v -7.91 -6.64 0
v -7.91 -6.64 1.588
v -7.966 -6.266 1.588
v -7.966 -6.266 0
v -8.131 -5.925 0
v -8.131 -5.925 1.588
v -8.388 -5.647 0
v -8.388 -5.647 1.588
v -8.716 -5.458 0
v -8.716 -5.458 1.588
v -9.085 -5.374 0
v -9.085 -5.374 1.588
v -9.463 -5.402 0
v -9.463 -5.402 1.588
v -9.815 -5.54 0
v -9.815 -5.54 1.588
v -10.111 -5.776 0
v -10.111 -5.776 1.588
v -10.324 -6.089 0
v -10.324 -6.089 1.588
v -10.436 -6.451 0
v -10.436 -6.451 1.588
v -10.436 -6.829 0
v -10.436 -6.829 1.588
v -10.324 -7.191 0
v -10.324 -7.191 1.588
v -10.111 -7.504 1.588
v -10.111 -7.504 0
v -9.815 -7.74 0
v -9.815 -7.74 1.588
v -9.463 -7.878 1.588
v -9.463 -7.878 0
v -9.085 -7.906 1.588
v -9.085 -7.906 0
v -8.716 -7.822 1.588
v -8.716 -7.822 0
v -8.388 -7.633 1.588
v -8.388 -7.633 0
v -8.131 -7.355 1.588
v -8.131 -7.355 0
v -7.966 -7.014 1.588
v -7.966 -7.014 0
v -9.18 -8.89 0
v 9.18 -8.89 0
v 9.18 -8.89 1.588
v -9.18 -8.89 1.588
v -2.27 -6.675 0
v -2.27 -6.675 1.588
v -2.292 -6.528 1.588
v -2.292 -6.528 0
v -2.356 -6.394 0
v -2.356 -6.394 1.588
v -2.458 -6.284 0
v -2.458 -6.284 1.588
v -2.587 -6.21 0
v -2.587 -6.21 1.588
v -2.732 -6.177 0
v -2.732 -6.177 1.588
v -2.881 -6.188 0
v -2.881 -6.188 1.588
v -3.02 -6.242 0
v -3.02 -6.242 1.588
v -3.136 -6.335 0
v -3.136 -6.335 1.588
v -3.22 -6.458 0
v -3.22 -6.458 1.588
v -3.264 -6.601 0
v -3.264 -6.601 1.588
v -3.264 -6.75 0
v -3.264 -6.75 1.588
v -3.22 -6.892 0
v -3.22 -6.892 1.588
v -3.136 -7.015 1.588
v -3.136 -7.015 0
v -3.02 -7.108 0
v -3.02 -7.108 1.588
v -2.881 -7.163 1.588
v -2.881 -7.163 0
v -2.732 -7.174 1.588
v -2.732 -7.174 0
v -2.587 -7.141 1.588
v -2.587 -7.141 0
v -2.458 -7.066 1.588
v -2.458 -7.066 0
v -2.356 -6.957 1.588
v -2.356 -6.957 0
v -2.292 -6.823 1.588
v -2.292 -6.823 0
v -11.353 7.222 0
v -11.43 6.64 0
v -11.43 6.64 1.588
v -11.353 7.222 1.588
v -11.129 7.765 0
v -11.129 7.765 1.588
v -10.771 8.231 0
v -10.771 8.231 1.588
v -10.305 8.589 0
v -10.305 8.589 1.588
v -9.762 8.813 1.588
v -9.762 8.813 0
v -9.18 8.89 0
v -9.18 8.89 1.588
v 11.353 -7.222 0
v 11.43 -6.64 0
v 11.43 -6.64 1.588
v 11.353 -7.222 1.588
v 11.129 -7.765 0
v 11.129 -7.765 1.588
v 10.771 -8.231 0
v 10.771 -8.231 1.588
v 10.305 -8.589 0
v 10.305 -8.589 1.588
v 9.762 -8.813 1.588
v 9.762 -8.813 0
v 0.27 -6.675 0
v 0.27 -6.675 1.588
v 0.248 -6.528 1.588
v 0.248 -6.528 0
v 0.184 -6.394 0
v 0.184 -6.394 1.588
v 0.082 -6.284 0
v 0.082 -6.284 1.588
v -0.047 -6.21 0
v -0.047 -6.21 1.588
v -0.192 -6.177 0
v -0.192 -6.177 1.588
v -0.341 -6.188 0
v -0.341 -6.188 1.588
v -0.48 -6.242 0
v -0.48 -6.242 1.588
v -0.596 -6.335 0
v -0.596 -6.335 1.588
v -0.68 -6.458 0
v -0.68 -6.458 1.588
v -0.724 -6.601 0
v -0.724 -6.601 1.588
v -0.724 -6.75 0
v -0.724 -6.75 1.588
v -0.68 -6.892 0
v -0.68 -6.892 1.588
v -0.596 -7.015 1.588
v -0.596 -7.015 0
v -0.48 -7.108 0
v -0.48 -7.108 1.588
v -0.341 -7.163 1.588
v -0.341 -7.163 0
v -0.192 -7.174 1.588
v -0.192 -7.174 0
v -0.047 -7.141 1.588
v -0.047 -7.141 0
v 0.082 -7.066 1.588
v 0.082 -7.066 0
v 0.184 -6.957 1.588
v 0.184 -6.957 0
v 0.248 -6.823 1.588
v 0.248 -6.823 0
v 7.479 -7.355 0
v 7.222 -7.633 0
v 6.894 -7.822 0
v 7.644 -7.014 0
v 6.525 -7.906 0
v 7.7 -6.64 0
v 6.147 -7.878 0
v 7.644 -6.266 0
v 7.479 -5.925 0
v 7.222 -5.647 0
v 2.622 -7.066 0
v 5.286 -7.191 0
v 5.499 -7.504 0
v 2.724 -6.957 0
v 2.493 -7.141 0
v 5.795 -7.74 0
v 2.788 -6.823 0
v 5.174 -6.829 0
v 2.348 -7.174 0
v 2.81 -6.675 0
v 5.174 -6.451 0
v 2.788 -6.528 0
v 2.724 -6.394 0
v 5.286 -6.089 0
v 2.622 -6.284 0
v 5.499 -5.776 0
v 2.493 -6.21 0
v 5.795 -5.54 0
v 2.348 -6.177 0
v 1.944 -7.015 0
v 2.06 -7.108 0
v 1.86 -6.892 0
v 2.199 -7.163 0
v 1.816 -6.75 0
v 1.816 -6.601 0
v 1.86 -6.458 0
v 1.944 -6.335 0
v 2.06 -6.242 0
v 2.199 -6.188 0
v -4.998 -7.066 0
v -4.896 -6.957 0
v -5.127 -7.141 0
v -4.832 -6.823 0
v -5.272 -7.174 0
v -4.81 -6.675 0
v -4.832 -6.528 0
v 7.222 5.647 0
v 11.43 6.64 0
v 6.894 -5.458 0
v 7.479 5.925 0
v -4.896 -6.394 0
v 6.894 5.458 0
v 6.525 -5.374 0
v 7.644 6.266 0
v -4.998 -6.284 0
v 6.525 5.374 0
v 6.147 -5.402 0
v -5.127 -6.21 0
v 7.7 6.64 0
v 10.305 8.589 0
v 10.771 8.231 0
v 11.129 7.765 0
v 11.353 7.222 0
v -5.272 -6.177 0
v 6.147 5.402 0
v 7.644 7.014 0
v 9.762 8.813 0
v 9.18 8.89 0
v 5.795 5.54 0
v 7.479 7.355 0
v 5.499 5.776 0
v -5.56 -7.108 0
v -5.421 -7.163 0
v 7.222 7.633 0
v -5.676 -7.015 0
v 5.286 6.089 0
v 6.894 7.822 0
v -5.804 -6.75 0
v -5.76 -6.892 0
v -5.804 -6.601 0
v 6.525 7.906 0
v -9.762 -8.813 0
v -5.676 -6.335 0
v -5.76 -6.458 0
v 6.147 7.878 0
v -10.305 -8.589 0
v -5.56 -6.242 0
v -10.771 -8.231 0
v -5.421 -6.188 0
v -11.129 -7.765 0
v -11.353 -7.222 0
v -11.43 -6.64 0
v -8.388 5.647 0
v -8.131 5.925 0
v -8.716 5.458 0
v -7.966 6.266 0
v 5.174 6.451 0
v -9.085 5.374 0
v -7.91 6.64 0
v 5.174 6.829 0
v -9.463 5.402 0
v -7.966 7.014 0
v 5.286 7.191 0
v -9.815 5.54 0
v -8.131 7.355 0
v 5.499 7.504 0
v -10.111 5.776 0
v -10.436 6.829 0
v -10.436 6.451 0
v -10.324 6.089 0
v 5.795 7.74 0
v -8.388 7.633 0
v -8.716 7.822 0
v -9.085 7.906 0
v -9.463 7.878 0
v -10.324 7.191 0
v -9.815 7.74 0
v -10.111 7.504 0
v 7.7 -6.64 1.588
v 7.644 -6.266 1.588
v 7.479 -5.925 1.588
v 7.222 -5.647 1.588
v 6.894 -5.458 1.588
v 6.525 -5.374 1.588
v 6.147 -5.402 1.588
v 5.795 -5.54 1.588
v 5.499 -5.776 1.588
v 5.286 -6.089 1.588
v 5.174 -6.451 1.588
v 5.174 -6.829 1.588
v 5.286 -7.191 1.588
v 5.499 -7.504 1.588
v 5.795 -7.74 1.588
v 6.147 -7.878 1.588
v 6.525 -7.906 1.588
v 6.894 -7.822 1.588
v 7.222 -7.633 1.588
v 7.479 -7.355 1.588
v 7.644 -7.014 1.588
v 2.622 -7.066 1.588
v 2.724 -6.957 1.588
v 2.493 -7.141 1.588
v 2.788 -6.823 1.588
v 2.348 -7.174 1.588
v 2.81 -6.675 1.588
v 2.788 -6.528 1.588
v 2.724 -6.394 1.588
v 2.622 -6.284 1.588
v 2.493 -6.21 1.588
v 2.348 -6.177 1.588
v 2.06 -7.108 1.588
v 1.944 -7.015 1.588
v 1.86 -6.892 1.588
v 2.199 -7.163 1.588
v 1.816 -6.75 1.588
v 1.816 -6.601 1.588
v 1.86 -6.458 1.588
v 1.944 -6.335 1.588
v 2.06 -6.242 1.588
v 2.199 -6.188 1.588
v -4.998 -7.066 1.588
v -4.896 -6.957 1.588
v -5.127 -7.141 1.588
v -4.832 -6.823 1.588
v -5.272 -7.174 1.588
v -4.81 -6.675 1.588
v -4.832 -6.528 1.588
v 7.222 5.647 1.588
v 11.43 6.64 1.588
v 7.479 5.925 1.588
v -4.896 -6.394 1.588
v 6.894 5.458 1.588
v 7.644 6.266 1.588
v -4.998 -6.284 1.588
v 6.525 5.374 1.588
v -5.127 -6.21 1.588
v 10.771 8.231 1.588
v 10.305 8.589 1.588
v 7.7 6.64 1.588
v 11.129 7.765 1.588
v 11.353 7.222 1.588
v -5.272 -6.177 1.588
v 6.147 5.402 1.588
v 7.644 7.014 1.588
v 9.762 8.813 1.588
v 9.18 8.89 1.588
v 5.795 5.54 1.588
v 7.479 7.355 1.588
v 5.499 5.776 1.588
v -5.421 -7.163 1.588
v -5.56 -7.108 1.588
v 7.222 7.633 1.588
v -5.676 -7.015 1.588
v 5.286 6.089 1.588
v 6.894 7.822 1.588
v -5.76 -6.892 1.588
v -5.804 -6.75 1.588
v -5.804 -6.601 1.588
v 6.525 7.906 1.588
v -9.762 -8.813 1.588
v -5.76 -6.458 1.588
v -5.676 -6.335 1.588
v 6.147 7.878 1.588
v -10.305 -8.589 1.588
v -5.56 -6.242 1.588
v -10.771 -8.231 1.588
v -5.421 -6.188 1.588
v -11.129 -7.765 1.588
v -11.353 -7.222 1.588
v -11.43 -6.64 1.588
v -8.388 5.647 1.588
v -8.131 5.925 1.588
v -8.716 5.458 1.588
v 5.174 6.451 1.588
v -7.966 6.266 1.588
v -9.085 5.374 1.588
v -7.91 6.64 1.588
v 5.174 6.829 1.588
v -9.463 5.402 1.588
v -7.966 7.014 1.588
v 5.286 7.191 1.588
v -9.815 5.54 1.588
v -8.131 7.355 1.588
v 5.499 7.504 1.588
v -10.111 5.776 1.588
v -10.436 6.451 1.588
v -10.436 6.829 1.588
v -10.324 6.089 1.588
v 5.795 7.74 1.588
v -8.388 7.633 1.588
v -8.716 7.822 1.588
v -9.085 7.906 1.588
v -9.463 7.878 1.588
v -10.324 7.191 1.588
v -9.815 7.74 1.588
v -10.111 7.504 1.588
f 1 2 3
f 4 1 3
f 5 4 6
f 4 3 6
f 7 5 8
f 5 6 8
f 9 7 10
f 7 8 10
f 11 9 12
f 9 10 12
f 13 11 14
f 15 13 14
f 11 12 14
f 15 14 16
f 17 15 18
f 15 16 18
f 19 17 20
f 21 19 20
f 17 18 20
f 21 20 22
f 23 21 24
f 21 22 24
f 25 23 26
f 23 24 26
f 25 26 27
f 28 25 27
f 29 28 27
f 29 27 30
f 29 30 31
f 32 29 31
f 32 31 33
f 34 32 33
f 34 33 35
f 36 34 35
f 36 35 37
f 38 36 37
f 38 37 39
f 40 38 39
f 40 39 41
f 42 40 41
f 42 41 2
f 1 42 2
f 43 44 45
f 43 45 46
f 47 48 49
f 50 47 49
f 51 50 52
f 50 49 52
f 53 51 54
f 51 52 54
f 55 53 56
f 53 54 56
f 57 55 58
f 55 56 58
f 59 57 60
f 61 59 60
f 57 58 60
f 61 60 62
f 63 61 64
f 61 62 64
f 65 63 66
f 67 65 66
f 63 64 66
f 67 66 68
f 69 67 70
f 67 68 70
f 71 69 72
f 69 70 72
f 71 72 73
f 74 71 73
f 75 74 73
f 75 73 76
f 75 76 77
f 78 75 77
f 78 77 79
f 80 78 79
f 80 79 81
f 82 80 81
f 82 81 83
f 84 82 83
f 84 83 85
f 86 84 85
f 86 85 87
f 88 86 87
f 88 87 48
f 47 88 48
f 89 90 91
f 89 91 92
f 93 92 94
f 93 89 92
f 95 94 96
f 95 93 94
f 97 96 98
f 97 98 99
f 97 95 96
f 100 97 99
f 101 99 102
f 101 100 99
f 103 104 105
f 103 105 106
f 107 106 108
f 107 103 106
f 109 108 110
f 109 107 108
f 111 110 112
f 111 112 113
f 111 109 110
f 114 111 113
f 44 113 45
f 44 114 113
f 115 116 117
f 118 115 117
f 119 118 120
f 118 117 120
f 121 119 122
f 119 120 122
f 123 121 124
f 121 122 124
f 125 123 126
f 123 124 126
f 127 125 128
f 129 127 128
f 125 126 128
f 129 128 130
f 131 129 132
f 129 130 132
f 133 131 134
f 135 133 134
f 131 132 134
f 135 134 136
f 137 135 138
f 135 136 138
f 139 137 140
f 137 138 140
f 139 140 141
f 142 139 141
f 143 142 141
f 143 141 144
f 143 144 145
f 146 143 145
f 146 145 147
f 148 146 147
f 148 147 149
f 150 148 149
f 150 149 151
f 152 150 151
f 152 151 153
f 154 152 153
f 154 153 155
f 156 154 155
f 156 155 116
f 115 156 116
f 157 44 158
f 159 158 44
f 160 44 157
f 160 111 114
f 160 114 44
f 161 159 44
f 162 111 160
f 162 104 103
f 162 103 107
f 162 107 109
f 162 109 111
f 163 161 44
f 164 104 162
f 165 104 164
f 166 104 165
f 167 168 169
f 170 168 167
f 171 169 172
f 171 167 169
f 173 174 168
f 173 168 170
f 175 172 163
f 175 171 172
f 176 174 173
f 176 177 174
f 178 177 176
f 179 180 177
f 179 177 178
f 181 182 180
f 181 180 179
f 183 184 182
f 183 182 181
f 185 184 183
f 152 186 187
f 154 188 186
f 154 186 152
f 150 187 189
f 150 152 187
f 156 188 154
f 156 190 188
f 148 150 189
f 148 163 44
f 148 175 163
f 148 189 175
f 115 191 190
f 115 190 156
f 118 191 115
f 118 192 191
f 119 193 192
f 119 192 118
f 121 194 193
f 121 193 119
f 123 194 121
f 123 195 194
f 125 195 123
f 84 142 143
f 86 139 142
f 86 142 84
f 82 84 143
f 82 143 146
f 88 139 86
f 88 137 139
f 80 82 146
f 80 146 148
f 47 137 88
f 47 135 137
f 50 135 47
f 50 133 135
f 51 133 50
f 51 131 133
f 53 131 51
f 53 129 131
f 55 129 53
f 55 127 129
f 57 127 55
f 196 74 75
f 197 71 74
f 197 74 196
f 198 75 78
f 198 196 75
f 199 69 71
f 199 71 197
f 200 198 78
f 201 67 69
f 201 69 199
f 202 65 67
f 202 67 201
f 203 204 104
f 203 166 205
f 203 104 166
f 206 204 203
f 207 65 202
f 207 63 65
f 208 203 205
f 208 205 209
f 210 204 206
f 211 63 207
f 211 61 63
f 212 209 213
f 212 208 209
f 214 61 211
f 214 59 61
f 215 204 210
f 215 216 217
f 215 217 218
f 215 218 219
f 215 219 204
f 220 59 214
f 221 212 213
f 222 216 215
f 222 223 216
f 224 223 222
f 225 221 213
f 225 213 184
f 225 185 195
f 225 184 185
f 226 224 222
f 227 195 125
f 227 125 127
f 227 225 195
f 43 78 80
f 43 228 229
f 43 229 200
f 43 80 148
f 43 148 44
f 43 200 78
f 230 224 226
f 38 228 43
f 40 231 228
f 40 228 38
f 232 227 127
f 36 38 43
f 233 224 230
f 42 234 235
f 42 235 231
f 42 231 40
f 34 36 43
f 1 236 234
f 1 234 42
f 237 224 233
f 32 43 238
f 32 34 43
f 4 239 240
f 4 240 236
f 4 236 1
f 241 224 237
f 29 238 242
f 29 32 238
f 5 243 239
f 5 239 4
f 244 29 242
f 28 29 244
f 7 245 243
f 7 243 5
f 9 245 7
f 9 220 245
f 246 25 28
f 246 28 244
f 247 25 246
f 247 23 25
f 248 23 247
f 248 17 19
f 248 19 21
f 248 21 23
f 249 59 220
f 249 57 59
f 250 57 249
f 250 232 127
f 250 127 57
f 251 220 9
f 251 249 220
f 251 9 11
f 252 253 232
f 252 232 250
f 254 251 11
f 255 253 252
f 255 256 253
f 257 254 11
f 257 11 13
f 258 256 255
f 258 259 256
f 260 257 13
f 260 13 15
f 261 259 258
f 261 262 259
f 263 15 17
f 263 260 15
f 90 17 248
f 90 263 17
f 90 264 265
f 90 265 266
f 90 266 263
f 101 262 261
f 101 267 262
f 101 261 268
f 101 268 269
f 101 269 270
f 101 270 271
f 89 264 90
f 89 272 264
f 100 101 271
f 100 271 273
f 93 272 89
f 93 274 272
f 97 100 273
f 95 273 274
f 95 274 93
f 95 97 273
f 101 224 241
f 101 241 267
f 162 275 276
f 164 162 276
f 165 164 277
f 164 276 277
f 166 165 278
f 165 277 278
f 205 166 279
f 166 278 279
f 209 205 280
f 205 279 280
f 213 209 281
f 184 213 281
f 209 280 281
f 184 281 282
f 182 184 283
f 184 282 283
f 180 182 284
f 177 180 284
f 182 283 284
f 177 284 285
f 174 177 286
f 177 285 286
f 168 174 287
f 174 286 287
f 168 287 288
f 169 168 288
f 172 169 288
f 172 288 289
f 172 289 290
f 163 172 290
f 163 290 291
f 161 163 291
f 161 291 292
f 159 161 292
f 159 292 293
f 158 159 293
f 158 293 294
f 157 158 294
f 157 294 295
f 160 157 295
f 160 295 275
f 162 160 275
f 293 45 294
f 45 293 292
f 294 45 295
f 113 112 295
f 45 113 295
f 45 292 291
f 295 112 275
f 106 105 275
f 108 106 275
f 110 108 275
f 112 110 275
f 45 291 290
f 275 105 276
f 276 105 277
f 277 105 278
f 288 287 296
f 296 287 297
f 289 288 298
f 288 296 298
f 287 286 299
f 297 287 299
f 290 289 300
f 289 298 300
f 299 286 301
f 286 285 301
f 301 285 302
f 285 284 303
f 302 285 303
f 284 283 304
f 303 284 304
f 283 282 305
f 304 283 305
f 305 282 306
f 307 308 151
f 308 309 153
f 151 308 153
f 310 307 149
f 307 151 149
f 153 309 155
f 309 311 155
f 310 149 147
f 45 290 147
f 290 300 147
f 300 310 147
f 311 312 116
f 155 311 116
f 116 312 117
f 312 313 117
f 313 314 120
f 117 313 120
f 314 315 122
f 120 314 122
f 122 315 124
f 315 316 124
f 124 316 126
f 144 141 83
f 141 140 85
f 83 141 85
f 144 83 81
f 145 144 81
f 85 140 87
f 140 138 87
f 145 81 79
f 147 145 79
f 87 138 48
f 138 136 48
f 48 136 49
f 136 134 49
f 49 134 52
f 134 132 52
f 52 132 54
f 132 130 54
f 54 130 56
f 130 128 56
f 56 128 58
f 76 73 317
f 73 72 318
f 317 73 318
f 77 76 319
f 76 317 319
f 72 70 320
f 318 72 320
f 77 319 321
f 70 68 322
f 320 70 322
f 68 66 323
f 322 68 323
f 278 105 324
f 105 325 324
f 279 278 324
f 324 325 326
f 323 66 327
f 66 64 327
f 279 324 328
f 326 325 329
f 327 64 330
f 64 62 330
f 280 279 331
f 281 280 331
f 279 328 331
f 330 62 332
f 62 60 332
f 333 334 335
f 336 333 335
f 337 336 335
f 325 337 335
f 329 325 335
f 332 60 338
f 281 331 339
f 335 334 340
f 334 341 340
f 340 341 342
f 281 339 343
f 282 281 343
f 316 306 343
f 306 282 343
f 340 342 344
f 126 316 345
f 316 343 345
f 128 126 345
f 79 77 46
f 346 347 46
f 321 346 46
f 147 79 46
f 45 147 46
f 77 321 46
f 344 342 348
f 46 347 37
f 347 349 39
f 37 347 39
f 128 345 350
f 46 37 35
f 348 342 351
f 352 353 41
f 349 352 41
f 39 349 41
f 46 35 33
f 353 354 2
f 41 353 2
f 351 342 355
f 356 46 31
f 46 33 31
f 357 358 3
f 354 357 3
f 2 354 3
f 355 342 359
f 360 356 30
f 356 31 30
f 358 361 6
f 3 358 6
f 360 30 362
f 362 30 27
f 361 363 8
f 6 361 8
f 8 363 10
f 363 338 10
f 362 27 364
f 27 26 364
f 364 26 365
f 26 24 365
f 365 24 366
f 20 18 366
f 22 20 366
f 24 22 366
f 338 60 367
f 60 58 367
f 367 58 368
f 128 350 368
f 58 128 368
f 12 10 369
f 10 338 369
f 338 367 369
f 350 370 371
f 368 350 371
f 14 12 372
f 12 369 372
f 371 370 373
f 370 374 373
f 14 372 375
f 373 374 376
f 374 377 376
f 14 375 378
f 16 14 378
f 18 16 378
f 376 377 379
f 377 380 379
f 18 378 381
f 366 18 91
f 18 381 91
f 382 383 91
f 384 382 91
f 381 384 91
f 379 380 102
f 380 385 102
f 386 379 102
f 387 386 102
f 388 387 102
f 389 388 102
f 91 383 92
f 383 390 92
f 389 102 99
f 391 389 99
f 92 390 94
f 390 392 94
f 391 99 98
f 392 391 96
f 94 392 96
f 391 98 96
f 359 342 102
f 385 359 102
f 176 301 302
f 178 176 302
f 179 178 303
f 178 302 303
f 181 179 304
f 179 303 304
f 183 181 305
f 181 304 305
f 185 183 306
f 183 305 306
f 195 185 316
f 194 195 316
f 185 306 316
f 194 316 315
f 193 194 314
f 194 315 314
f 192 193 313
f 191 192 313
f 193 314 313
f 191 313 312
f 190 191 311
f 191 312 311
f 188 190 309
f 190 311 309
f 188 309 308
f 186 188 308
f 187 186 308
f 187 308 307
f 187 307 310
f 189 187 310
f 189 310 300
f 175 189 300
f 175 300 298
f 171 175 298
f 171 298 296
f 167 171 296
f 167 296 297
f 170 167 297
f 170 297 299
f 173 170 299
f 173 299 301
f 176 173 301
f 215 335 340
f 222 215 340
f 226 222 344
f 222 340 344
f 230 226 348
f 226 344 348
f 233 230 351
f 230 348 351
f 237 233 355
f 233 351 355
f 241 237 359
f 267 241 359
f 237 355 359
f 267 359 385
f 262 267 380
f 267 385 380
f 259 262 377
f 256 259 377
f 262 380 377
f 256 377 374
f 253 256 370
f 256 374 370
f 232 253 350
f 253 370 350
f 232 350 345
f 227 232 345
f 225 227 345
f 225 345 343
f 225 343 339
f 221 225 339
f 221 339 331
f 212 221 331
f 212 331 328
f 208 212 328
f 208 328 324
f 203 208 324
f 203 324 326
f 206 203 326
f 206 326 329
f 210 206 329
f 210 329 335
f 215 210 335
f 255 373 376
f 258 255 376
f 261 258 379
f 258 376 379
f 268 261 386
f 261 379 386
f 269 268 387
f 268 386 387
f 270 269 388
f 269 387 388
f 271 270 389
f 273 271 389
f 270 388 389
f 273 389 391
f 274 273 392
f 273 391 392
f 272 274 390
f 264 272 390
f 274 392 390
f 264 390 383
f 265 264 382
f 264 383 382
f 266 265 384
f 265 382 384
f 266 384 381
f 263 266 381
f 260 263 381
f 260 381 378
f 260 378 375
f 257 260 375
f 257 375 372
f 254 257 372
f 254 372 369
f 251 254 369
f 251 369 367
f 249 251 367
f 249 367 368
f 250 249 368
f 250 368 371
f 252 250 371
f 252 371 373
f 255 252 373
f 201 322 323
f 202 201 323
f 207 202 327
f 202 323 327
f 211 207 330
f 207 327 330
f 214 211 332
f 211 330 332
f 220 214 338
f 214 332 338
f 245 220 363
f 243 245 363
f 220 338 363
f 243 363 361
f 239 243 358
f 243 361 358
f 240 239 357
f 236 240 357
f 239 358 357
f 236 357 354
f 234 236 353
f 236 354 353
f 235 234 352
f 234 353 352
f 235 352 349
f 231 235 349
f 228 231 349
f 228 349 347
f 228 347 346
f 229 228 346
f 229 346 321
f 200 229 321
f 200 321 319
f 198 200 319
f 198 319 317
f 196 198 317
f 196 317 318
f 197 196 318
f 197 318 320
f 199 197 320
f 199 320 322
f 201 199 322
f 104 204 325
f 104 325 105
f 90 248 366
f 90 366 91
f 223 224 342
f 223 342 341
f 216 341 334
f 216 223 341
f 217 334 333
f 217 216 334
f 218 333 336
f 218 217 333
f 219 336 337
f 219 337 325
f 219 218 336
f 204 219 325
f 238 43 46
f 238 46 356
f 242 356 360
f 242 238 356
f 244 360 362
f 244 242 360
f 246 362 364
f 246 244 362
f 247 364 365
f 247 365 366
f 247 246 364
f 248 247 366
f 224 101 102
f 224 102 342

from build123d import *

# Parameters (mm, degrees)
BOSS_EXTRUDE1_DEPTH = 1.5875
SKETCH2_R           = 1.27
SKETCH2_R_2         = 0.5
CUT_EXTRUDE1_DEPTH  = 15.566988579


with BuildPart() as part:
    # Sketch1 → Boss-Extrude1 (new body)
    with BuildSketch(Plane.XY):
        with BuildLine():
            Line((9.18, -8.89), (-9.18, -8.89))
            ThreePointArc((-9.18, -8.89), (-10.770990258, -8.230990258), (-11.43, -6.64))
            Line((-11.43, -6.64), (-11.43, 6.64))
            ThreePointArc((-11.43, 6.64), (-10.770990258, 8.230990258), (-9.18, 8.89))
            Line((-9.18, 8.89), (9.18, 8.89))
            ThreePointArc((9.18, 8.89), (10.770990258, 8.230990258), (11.43, 6.64))
            Line((11.43, 6.64), (11.43, -6.64))
            ThreePointArc((11.43, -6.64), (10.770990258, -8.230990258), (9.18, -8.89))
        make_face()
    extrude(amount=BOSS_EXTRUDE1_DEPTH)

    # Sketch2 → Cut-Extrude1 (cut, through all)
    with BuildSketch(Plane.XY.offset(1.5875)):
        with Locations((-9.18, 6.64)):
            Circle(SKETCH2_R)
        with Locations((6.43, 6.64)):
            Circle(SKETCH2_R)
        with Locations((6.43, -6.64)):
            Circle(SKETCH2_R)
        with Locations((-9.18, -6.64)):
            Circle(SKETCH2_R)
        with Locations((-5.309559509, -6.675167708)):
            Circle(SKETCH2_R_2)
        with Locations((-2.769559509, -6.675167708)):
            Circle(SKETCH2_R_2)
        with Locations((-0.229559509, -6.675167708)):
            Circle(SKETCH2_R_2)
        with Locations((2.310440491, -6.675167708)):
            Circle(SKETCH2_R_2)
    extrude(amount=-CUT_EXTRUDE1_DEPTH, mode=Mode.SUBTRACT)


solid = part.part
